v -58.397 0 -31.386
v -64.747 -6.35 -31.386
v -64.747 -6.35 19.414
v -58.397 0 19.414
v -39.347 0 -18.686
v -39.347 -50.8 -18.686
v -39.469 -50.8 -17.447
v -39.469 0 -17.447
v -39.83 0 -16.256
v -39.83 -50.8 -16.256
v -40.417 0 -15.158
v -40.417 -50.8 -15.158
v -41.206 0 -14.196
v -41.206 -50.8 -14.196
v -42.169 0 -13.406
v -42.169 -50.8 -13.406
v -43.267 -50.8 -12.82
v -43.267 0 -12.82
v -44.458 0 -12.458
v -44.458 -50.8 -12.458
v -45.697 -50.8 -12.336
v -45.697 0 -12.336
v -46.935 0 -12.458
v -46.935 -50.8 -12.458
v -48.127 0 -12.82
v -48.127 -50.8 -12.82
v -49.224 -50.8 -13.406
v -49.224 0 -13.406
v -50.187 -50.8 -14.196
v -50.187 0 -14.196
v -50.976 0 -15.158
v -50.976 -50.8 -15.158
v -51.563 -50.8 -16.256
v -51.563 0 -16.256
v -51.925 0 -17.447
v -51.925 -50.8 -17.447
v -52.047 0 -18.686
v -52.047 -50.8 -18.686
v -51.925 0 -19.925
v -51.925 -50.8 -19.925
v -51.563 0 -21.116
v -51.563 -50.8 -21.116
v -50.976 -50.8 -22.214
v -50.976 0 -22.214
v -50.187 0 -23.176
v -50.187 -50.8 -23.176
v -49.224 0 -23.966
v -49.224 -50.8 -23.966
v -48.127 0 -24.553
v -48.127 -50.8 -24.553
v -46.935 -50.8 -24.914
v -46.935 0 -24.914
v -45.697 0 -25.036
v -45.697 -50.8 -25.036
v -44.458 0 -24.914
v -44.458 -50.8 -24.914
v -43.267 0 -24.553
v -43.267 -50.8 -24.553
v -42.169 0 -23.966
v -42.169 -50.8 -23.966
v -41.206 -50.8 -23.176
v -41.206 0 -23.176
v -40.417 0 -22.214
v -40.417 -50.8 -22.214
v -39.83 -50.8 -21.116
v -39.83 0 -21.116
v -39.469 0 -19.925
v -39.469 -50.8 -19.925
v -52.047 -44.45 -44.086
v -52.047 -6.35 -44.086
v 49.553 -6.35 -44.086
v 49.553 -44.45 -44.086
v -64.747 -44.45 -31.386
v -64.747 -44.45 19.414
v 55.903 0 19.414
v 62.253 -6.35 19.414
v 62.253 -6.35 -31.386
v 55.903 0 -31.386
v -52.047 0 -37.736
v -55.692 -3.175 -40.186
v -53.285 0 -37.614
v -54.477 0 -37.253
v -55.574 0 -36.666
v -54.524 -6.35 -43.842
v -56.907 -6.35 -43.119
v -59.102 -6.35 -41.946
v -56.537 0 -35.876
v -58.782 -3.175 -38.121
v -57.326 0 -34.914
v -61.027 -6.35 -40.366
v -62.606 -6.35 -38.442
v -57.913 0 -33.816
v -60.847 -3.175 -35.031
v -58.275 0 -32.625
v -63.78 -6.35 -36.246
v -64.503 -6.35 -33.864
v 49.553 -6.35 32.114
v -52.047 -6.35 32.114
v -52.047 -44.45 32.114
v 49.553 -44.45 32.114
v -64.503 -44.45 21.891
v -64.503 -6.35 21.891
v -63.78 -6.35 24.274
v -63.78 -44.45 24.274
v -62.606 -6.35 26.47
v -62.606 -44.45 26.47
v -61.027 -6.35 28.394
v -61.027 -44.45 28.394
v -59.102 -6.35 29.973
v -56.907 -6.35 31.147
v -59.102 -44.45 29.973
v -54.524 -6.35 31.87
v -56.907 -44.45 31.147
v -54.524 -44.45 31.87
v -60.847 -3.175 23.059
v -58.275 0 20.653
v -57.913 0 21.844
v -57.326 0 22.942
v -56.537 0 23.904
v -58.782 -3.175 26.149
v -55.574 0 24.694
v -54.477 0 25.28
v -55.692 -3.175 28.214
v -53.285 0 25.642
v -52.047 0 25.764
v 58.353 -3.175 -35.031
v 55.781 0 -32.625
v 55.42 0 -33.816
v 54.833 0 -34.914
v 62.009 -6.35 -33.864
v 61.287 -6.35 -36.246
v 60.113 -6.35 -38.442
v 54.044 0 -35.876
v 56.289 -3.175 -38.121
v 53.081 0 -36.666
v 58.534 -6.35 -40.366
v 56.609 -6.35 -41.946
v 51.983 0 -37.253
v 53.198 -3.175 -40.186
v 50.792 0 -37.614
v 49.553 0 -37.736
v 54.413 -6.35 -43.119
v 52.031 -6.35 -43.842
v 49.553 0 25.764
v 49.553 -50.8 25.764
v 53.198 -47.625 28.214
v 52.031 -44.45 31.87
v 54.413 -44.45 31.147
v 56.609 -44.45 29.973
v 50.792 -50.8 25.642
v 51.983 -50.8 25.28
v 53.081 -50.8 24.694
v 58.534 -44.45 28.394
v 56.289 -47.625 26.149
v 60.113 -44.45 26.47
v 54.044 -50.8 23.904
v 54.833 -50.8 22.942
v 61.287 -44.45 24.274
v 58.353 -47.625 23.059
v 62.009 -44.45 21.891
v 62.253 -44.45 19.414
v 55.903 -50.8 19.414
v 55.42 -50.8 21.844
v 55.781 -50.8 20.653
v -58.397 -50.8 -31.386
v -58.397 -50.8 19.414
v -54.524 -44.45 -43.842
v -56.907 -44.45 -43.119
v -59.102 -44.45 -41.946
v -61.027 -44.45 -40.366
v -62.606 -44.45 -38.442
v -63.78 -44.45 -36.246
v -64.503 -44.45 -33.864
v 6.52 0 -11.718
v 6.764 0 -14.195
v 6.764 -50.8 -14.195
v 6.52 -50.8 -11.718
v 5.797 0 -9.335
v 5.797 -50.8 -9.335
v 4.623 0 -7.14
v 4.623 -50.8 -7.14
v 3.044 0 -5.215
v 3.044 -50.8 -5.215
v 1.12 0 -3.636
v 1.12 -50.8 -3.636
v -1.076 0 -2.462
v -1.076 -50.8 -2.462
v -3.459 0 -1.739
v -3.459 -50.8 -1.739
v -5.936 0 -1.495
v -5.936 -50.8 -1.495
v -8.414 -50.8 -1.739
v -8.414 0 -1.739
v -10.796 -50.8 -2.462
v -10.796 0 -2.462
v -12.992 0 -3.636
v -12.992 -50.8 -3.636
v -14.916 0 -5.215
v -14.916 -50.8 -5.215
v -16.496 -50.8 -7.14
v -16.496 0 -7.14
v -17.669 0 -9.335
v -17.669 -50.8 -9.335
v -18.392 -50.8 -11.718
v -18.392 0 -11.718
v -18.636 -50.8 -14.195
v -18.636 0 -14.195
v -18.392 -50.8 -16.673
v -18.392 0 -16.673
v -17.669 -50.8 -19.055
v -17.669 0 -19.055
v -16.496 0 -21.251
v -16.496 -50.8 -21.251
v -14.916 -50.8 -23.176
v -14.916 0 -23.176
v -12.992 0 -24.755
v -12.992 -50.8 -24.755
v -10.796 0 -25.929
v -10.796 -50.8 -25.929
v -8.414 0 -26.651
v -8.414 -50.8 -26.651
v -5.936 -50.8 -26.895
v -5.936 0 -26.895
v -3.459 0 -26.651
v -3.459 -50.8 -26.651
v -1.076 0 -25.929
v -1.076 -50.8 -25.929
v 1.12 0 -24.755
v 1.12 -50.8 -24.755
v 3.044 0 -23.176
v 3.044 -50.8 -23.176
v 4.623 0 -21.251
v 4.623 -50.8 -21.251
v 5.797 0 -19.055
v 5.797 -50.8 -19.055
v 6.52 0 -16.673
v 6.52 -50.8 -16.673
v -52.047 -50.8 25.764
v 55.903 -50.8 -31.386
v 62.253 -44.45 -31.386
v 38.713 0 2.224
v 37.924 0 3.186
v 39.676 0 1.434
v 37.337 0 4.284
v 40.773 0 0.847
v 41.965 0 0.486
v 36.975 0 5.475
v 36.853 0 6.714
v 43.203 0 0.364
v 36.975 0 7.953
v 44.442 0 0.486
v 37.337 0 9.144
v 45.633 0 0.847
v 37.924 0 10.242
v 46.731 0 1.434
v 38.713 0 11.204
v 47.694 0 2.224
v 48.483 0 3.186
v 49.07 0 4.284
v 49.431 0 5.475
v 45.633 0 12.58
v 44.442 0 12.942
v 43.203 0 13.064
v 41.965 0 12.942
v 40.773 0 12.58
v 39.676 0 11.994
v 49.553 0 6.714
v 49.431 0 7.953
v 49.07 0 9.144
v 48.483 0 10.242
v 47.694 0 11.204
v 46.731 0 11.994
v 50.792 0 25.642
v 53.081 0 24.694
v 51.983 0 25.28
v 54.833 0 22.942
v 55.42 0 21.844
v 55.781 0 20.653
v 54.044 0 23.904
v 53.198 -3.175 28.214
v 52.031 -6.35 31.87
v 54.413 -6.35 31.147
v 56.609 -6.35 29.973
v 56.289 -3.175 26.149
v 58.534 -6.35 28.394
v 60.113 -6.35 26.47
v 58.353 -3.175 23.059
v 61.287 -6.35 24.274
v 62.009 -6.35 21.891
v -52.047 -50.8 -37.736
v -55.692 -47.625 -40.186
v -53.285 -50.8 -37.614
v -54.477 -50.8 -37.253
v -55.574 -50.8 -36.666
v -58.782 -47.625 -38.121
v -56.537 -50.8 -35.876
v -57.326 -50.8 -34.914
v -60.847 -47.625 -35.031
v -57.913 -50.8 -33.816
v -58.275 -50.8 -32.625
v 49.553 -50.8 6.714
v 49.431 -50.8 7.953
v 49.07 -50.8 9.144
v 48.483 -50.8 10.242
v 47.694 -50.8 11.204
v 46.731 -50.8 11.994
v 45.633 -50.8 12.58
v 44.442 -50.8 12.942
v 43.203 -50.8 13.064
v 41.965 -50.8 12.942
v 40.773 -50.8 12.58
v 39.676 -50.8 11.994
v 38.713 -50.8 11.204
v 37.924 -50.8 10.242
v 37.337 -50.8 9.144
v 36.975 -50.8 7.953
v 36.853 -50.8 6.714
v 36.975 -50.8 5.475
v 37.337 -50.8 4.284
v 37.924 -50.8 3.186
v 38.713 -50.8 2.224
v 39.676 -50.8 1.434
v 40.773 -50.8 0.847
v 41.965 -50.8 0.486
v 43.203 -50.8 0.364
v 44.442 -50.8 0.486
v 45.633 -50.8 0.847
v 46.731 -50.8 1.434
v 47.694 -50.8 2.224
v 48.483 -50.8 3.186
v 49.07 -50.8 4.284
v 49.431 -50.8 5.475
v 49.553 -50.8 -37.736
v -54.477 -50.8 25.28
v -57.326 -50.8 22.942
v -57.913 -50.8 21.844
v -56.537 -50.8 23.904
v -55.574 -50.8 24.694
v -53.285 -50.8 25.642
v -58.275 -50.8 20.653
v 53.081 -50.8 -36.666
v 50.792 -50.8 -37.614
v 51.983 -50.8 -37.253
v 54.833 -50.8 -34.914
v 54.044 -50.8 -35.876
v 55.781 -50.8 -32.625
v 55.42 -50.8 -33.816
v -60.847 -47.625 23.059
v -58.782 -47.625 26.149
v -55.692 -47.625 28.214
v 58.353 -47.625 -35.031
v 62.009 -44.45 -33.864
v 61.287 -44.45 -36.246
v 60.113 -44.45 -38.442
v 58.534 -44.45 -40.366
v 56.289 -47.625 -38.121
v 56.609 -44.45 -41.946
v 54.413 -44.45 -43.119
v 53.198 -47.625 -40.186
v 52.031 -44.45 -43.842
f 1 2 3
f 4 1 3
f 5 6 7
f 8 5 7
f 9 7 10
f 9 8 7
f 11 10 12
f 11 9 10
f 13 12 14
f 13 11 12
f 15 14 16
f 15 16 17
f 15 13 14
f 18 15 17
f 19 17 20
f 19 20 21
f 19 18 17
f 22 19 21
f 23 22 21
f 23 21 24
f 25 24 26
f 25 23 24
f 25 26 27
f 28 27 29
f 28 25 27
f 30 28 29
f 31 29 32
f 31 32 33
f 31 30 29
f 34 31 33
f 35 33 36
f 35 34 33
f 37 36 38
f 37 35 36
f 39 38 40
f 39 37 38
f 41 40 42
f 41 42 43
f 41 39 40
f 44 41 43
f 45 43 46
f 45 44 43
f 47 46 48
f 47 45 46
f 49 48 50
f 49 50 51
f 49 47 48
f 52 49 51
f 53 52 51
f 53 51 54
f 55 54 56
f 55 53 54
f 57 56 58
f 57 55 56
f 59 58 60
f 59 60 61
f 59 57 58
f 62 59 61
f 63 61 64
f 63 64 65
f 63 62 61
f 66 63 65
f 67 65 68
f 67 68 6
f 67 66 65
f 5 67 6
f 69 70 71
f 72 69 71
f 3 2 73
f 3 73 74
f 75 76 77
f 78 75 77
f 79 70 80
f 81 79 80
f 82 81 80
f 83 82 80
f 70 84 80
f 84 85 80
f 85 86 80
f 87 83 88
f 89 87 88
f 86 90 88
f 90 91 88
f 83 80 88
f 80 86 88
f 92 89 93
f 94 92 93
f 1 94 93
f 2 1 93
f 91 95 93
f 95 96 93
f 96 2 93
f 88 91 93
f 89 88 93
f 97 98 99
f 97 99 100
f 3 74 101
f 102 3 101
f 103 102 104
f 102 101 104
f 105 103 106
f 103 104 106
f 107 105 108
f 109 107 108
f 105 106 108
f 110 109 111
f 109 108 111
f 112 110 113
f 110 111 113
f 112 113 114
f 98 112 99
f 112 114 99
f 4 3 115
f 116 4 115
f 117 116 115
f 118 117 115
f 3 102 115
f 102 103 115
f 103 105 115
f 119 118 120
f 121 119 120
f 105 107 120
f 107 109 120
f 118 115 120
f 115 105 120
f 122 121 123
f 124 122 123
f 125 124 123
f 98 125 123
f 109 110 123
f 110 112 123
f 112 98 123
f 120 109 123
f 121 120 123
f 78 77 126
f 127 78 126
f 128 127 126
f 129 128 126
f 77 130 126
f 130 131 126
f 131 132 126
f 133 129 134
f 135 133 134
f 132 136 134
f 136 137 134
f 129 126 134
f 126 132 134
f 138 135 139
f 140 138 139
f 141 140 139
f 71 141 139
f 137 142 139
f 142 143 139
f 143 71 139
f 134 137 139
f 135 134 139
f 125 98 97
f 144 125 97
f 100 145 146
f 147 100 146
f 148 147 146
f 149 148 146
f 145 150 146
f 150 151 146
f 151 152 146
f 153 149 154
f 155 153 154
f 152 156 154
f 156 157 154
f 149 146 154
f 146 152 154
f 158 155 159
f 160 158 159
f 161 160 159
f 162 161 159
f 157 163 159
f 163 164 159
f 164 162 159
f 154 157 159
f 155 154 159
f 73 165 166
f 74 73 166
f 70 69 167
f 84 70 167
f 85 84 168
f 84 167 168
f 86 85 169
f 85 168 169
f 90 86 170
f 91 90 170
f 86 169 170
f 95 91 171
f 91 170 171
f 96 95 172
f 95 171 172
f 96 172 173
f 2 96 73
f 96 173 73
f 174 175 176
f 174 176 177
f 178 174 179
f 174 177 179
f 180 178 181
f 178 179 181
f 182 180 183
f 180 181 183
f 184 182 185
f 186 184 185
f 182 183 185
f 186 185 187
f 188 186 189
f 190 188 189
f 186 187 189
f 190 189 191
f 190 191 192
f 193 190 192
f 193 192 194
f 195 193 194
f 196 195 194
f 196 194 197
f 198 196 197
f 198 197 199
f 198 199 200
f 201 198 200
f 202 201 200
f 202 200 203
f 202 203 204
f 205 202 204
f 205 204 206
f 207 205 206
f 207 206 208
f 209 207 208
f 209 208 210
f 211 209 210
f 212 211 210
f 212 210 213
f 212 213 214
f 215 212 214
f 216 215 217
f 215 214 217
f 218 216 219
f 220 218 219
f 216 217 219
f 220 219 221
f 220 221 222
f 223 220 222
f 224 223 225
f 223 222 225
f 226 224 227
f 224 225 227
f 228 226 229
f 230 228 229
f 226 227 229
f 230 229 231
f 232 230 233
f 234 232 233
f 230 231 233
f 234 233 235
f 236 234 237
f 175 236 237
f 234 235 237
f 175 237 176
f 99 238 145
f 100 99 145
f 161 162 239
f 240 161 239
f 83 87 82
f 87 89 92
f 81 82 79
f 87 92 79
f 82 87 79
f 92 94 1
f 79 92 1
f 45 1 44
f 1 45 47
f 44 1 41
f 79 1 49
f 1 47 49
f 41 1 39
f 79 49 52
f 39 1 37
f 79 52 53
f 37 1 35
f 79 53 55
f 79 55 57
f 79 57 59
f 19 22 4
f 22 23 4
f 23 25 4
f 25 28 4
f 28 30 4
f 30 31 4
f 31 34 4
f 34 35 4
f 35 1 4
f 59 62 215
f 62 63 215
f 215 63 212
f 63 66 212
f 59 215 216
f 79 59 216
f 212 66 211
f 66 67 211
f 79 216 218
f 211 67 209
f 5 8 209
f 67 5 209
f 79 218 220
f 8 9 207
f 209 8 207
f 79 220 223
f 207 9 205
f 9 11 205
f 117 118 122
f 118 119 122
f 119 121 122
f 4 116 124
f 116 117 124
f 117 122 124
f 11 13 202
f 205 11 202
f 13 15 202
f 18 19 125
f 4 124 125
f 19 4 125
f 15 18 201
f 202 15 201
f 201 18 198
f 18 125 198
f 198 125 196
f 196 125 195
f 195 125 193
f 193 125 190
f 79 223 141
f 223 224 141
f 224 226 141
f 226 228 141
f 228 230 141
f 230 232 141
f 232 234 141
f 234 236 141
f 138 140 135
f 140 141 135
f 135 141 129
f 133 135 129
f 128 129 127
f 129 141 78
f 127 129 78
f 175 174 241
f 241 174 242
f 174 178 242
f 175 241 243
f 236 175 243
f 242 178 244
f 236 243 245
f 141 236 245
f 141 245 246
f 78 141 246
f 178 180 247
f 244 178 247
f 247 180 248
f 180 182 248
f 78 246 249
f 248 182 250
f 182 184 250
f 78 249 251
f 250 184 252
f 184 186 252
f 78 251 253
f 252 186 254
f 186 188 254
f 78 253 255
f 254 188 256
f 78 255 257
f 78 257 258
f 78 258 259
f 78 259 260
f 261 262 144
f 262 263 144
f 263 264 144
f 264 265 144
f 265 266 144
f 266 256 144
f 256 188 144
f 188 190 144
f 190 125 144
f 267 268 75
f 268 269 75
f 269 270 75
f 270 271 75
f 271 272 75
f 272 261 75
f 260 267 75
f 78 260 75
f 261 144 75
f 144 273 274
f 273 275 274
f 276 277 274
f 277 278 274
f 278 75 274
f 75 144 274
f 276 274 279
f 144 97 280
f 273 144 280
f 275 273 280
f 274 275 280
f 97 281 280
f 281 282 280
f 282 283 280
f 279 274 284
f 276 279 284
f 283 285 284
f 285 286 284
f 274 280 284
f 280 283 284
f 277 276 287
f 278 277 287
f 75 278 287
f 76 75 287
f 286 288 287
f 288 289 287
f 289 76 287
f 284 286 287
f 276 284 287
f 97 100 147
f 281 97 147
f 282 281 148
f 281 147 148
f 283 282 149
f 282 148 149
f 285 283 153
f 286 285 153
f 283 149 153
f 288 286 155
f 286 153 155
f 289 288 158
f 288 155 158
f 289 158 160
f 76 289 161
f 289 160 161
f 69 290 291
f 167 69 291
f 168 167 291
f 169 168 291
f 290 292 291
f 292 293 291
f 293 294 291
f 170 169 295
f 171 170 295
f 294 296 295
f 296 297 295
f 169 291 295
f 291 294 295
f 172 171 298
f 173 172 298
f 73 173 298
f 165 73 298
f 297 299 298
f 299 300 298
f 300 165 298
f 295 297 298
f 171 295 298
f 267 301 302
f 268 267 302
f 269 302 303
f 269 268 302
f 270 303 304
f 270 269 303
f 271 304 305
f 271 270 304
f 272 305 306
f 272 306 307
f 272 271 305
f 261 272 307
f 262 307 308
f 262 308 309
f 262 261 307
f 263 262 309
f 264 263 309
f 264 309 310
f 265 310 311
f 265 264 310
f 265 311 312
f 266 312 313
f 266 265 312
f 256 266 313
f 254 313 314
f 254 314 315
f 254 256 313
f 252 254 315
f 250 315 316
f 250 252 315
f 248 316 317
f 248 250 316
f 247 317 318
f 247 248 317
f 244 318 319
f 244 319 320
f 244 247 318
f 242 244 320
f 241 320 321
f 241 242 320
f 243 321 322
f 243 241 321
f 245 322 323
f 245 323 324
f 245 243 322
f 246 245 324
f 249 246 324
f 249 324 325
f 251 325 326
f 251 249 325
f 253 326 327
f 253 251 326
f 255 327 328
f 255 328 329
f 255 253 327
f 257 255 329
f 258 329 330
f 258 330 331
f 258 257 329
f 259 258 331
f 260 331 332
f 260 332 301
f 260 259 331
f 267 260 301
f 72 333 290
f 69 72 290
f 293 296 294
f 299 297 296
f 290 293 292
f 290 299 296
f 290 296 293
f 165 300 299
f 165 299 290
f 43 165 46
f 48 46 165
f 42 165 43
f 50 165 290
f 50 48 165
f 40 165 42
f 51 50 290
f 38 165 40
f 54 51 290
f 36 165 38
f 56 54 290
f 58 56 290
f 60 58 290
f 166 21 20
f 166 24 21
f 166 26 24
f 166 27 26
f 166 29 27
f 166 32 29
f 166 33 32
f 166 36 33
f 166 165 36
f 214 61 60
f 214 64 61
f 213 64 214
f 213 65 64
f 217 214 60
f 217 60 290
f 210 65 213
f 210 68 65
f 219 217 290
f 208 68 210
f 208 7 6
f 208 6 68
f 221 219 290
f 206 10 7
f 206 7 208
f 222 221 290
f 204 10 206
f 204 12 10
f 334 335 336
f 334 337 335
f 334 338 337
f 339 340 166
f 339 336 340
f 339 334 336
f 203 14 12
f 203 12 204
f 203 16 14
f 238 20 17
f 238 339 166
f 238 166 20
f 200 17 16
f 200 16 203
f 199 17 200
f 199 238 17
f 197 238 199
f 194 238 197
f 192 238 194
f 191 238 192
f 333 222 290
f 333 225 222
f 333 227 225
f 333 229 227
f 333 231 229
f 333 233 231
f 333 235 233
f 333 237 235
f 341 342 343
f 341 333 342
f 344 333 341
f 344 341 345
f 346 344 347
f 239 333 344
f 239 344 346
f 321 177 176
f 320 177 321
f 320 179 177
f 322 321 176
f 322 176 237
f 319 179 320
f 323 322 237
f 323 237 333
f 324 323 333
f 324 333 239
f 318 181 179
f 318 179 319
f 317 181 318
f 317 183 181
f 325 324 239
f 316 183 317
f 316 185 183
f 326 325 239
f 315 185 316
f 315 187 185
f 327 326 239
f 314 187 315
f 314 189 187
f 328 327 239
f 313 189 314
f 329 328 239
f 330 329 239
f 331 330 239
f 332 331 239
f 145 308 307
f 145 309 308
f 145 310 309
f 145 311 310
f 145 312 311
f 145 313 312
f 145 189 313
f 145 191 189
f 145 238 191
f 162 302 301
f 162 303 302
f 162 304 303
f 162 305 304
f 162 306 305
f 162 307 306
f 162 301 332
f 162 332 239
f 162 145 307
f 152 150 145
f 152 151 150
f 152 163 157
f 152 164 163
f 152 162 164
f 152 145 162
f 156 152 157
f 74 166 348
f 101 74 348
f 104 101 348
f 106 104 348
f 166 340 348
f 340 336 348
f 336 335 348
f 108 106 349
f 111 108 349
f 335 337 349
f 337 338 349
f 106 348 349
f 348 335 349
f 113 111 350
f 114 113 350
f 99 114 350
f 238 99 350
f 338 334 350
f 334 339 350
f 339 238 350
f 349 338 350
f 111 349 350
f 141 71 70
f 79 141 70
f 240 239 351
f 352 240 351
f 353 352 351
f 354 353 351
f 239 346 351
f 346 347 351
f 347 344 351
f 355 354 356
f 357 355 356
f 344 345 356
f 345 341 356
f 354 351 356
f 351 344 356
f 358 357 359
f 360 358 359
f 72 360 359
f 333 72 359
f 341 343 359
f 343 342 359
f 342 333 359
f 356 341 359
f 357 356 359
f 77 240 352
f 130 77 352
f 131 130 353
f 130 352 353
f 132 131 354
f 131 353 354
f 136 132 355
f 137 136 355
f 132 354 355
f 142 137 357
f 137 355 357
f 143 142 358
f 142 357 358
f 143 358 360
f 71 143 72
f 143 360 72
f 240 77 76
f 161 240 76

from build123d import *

# Parameters (mm, degrees)
F0_W     = 127
F0_H     = 76.2
F0_R     = 6.35
F1_DEPTH = 50.8
F2_R     = 12.7
F3_DEPTH = 60.452
F4_R     = 12.7
F5_R     = 12.7
F6_R     = 12.7
F7_R     = 12.7
F8_SIZE  = 6.35
F9_SIZE  = 6.35


with BuildPart() as f1:
    # F0 (on Front) → F1 (new body)
    with BuildSketch(Plane.XZ):
        with Locations((-1.246627, -5.986213)):
            Rectangle(F0_W, F0_H)
        with Locations((-45.696627, -18.686213)):
            Circle(F0_R, mode=Mode.SUBTRACT)
        with Locations((43.203373, 6.713787)):
            Circle(F0_R, mode=Mode.SUBTRACT)
    extrude(amount=F1_DEPTH)

    # F2 (on face) → F3 (cut)
    with BuildSketch(Plane.XZ.offset(50.8)):
        with Locations((-5.936226, -14.195322)):
            Circle(F2_R)
    extrude(amount=-F3_DEPTH, mode=Mode.SUBTRACT)

    # F4
    f4_edges = [f1.edges().sort_by_distance(p)[0] for p in [
        (-64.746627, -25.4, 32.113787),
    ]]
    fillet(f4_edges, radius=F4_R)

    # F5
    f5_edges = [f1.edges().sort_by_distance(p)[0] for p in [
        (62.253373, -25.4, 32.113787),
    ]]
    fillet(f5_edges, radius=F5_R)

    # F6
    f6_edges = [f1.edges().sort_by_distance(p)[0] for p in [
        (62.253373, -25.4, -44.086213),
    ]]
    fillet(f6_edges, radius=F6_R)

    # F7
    f7_edges = [f1.edges().sort_by_distance(p)[0] for p in [
        (-64.746627, -25.4, -44.086213),
    ]]
    fillet(f7_edges, radius=F7_R)

    # F8
    f8_edges = [f1.edges().sort_by_distance(p)[0] for p in [
        (-1.246627, 0, 32.113787),
    ]]
    chamfer(f8_edges, length=F8_SIZE)

    # F9
    f9_edges = [f1.edges().sort_by_distance(p)[0] for p in [
        (-1.246627, -50.8, 32.113787),
    ]]
    chamfer(f9_edges, length=F9_SIZE)


solid = f1.part
